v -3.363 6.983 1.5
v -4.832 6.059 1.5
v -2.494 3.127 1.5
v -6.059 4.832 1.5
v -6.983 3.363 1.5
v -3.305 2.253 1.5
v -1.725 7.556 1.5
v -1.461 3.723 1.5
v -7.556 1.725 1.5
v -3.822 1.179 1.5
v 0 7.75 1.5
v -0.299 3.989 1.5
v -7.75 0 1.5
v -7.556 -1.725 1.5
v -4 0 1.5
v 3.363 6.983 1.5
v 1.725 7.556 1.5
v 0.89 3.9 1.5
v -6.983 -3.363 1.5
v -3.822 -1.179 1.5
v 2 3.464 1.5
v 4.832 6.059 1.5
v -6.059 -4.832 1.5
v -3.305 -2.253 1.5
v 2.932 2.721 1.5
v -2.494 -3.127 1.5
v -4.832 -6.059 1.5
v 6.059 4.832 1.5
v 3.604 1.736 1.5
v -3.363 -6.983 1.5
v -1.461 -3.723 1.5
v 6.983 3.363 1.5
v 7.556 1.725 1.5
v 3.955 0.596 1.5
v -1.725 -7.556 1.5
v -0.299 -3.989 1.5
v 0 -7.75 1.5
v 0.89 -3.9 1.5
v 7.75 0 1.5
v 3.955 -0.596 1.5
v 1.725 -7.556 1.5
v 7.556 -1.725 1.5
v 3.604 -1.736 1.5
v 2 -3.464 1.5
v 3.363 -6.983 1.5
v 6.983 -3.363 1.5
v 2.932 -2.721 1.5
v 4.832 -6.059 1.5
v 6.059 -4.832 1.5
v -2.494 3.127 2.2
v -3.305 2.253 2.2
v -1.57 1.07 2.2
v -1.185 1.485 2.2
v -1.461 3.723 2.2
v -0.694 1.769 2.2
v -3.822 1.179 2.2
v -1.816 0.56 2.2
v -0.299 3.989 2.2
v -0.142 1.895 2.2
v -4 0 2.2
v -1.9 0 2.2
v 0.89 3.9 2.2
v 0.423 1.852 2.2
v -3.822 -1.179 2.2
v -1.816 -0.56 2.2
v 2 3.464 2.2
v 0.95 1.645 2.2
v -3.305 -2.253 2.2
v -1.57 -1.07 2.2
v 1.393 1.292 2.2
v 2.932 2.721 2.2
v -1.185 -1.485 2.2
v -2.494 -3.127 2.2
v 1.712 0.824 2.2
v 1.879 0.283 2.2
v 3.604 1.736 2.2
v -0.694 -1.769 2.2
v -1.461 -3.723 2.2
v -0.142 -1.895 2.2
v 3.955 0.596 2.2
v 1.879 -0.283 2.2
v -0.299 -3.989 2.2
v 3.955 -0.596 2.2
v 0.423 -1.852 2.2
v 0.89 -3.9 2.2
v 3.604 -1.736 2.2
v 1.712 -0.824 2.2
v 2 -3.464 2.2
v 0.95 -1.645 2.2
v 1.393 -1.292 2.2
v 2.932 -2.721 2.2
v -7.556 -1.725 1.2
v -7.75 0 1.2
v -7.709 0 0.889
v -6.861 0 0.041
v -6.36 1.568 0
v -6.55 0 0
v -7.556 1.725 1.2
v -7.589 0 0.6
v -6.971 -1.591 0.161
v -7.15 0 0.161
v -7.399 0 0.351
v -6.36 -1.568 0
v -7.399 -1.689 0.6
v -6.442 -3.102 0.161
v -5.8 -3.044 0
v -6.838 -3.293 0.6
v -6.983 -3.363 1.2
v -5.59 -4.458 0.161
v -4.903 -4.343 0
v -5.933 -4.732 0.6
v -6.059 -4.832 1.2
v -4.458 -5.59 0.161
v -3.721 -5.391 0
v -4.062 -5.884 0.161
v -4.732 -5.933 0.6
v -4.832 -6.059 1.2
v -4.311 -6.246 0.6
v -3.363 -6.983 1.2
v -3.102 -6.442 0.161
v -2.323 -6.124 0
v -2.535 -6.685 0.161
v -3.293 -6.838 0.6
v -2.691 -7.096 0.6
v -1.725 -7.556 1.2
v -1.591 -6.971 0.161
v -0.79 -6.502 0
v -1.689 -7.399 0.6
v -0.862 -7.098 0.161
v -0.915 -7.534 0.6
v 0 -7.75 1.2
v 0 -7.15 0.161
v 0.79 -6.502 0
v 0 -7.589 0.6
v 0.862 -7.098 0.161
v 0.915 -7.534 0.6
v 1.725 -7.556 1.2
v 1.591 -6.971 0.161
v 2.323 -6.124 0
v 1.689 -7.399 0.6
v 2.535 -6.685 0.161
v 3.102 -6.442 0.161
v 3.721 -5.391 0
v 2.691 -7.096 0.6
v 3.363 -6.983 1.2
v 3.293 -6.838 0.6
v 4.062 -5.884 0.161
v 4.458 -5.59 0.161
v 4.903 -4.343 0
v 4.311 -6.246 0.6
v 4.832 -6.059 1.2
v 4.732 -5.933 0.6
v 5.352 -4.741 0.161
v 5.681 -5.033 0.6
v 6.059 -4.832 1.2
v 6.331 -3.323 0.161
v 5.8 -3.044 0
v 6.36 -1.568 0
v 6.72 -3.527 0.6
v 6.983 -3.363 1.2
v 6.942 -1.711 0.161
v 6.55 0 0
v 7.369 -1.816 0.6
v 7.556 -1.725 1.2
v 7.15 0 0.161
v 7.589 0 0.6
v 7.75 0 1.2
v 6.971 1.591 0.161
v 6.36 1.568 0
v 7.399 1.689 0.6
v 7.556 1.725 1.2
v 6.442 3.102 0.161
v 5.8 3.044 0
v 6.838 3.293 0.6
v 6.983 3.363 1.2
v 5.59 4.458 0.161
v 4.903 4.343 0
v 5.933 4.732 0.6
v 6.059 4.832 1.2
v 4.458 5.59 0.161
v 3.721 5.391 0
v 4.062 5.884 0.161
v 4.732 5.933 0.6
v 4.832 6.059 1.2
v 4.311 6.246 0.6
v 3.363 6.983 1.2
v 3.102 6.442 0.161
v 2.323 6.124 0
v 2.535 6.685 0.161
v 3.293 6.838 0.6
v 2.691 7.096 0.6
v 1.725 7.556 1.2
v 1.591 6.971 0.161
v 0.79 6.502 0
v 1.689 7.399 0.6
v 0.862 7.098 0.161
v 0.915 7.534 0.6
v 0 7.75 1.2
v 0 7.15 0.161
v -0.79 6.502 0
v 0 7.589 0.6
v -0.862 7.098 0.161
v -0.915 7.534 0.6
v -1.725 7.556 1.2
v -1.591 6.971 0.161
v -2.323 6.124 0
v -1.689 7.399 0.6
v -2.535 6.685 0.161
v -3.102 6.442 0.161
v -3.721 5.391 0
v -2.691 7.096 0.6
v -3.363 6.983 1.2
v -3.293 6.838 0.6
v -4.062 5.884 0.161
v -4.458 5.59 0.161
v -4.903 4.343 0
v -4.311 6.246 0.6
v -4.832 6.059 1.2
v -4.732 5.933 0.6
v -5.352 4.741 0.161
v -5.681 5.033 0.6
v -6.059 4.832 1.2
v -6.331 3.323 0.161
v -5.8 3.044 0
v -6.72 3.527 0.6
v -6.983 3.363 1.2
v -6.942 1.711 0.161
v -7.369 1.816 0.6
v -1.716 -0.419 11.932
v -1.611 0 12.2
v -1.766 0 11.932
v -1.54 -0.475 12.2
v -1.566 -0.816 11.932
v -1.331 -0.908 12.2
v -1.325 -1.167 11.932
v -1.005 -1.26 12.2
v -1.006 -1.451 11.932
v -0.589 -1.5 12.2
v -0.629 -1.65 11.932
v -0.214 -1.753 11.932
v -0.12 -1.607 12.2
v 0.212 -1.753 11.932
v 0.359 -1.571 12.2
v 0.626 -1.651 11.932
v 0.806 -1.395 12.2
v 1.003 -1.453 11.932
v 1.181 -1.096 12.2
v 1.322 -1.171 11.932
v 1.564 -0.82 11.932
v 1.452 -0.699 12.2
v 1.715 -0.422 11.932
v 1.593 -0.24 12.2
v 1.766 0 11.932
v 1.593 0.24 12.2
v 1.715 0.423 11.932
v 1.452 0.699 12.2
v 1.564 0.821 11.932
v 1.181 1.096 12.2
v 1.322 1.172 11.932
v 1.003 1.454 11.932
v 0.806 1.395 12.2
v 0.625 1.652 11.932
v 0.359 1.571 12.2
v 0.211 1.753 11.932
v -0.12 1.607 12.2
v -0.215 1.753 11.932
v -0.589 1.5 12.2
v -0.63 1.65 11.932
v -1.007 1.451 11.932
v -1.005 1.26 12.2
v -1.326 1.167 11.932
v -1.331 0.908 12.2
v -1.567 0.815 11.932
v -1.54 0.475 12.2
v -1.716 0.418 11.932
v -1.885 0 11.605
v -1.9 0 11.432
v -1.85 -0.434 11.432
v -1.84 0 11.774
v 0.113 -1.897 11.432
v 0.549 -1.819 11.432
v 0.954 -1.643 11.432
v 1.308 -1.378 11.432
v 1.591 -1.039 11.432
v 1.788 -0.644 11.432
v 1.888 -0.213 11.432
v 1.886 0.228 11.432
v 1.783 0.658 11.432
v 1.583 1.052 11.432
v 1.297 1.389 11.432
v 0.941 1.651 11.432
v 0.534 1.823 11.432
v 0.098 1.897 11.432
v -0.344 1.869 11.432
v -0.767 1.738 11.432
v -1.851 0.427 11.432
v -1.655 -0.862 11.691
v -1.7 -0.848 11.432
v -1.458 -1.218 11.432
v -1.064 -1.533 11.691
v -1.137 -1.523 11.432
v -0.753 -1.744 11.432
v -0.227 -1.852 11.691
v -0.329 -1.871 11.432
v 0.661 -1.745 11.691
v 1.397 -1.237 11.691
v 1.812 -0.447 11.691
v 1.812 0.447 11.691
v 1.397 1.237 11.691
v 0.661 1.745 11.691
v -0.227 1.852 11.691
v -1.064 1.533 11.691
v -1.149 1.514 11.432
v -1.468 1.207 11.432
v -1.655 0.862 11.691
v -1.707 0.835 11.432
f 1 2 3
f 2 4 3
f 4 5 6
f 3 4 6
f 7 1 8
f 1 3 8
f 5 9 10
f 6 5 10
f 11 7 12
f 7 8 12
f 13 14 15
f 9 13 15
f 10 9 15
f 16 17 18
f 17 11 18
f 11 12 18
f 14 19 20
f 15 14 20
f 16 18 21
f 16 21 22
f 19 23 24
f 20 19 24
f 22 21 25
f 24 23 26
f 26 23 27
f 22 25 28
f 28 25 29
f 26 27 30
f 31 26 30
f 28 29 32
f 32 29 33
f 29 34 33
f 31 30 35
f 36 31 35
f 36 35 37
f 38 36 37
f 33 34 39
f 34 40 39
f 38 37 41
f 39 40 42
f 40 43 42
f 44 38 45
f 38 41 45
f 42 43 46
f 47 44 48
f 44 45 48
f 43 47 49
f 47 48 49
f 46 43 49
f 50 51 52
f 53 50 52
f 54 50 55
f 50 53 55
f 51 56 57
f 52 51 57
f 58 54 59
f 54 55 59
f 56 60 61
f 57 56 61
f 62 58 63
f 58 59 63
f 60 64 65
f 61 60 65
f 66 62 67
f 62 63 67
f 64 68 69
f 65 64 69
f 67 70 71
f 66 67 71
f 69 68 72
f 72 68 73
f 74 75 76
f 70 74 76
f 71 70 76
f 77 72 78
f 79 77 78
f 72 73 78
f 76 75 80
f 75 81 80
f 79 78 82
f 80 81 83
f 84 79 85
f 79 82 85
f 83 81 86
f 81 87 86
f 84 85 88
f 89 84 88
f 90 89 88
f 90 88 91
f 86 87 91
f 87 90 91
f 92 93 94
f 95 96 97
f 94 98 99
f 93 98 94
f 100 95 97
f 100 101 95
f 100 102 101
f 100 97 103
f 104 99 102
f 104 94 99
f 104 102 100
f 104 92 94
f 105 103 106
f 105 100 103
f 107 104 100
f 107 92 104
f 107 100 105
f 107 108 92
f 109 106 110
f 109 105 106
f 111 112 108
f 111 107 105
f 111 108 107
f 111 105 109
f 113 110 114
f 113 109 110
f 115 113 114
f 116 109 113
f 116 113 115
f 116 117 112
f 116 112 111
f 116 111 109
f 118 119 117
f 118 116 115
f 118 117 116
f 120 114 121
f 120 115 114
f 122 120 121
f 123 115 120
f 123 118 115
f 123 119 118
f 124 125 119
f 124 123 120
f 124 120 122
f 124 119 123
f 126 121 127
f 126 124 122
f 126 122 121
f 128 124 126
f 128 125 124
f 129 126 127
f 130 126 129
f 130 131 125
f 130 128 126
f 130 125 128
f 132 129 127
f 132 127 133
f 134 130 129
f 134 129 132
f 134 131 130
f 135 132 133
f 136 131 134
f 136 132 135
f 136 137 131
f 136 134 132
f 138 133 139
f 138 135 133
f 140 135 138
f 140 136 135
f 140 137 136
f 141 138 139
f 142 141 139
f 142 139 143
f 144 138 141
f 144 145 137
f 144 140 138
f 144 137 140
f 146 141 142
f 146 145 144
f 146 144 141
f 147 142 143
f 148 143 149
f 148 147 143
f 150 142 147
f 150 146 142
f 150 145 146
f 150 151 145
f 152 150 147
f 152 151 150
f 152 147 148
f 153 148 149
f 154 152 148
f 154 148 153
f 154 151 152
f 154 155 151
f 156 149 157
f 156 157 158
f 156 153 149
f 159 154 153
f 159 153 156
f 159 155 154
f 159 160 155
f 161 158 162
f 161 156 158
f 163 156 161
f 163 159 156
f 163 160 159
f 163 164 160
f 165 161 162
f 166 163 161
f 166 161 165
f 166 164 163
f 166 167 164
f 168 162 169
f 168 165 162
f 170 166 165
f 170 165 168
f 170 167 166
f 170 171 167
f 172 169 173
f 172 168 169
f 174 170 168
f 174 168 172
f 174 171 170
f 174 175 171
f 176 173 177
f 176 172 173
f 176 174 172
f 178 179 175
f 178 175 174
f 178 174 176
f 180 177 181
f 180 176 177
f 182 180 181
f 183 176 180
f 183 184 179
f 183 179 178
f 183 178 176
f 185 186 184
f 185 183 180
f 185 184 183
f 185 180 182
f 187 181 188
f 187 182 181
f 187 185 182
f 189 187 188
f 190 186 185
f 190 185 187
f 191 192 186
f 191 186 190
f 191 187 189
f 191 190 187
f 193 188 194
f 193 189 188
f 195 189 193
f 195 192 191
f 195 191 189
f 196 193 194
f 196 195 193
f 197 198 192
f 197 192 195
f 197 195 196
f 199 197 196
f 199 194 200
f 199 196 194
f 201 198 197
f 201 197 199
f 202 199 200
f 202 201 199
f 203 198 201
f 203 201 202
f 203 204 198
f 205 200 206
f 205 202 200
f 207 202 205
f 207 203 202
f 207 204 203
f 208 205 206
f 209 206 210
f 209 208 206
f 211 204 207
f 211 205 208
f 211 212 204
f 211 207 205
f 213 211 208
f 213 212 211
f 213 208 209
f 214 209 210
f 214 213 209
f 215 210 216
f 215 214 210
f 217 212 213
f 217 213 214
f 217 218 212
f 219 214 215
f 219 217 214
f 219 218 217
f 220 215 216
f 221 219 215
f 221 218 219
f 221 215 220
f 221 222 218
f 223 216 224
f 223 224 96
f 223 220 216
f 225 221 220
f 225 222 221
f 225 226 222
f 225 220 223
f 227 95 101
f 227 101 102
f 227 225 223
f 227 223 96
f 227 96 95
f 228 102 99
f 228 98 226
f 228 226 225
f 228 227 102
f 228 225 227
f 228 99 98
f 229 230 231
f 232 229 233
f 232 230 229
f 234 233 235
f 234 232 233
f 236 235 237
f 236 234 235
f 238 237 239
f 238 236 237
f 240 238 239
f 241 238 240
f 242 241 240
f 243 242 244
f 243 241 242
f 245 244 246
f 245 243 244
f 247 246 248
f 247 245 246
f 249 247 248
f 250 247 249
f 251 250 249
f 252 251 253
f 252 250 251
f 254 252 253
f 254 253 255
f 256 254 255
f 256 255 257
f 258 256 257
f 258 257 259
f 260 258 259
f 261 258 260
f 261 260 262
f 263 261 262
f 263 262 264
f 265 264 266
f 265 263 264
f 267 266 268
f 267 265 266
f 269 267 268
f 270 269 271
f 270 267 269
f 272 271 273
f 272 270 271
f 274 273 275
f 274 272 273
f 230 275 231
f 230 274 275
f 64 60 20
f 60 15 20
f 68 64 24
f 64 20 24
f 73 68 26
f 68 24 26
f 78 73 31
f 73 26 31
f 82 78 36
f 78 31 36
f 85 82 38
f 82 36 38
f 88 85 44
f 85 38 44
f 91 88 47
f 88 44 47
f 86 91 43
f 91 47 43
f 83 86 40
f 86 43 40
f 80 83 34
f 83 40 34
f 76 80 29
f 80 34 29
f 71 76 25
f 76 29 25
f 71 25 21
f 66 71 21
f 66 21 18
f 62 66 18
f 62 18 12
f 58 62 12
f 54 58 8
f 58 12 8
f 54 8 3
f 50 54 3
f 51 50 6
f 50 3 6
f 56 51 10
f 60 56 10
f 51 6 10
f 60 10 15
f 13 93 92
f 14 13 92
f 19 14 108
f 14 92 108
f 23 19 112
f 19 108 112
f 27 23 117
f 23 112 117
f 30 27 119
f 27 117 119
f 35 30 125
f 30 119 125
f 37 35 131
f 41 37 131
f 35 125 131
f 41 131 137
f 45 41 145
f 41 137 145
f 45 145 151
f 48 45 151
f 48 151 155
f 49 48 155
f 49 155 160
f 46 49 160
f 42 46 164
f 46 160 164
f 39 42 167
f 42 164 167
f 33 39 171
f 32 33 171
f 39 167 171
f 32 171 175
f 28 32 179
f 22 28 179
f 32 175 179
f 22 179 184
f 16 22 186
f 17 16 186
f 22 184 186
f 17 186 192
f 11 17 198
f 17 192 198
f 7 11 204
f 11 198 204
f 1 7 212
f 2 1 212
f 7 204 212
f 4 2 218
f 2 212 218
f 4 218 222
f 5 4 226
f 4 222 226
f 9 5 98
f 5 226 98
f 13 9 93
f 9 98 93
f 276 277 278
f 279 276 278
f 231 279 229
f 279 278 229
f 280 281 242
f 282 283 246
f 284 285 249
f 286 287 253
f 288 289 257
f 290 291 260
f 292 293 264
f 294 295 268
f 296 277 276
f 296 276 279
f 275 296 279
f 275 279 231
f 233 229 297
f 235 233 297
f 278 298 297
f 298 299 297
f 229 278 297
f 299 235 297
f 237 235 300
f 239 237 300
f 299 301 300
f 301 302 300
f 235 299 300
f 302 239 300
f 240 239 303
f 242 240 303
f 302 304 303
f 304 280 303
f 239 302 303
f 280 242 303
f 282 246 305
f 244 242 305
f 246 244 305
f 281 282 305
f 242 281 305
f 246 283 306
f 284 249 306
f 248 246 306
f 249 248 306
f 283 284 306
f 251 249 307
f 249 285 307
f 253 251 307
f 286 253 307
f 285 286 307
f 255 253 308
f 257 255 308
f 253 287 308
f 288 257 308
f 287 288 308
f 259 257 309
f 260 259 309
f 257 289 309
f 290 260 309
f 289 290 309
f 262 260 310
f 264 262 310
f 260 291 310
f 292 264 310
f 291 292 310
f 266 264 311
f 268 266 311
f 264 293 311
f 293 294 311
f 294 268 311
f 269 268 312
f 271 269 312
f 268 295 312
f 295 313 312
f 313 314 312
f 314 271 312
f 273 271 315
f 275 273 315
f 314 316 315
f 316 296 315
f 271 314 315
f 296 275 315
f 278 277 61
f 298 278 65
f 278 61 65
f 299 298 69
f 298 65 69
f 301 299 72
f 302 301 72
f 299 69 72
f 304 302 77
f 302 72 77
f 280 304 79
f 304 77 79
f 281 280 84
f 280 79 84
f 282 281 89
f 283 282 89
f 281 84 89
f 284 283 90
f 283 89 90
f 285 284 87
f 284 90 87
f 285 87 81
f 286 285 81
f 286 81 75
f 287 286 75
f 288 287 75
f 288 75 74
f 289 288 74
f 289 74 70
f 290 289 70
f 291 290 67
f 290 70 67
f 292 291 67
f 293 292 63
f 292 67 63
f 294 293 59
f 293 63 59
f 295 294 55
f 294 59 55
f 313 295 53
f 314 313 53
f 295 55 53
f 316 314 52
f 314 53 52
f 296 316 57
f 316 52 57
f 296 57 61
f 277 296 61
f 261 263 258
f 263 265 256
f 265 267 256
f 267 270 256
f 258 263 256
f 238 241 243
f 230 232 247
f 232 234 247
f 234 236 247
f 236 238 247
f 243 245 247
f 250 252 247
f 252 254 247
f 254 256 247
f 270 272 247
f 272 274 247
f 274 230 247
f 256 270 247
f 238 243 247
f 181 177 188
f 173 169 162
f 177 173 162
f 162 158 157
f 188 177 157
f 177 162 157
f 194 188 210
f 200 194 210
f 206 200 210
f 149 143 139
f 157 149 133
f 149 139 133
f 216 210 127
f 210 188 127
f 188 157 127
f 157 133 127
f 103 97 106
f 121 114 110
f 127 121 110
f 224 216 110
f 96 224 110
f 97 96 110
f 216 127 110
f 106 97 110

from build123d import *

# Parameters (mm, degrees)
F2_R     = 1.2
F3_SIZE2 = 0.2886751346
F3_SIZE  = 0.5
F4_R     = 1


with BuildPart() as f1:
    # F0 (on Front) → F1 (revolve)
    with BuildSketch(Plane.XZ):
        Polygon((-7.75, 0), (0, 0), (0, 12.2), (-1.9, 12.2), (-1.9, 2.2), (-4, 2.2), (-4, 1.5), (-7.75, 1.5), align=None)
    revolve(axis=Axis((0, 0, 5.0761818423), (0, 0, 1)))

    # F2
    f2_edges = [f1.edges().sort_by_distance(p)[0] for p in [
        (7.75, 0, 0),
    ]]
    fillet(f2_edges, radius=F2_R)

    # F3
    f3_edges = [f1.edges().sort_by_distance(p)[0] for p in [
        (1.9, 0, 12.2),
    ]]
    chamfer(f3_edges, length=F3_SIZE, length2=F3_SIZE2)

    # F4
    f4_edges = [f1.edges().sort_by_distance(p)[0] for p in [
        (1.9, 0, 11.7),
    ]]
    fillet(f4_edges, radius=F4_R)


solid = f1.part
